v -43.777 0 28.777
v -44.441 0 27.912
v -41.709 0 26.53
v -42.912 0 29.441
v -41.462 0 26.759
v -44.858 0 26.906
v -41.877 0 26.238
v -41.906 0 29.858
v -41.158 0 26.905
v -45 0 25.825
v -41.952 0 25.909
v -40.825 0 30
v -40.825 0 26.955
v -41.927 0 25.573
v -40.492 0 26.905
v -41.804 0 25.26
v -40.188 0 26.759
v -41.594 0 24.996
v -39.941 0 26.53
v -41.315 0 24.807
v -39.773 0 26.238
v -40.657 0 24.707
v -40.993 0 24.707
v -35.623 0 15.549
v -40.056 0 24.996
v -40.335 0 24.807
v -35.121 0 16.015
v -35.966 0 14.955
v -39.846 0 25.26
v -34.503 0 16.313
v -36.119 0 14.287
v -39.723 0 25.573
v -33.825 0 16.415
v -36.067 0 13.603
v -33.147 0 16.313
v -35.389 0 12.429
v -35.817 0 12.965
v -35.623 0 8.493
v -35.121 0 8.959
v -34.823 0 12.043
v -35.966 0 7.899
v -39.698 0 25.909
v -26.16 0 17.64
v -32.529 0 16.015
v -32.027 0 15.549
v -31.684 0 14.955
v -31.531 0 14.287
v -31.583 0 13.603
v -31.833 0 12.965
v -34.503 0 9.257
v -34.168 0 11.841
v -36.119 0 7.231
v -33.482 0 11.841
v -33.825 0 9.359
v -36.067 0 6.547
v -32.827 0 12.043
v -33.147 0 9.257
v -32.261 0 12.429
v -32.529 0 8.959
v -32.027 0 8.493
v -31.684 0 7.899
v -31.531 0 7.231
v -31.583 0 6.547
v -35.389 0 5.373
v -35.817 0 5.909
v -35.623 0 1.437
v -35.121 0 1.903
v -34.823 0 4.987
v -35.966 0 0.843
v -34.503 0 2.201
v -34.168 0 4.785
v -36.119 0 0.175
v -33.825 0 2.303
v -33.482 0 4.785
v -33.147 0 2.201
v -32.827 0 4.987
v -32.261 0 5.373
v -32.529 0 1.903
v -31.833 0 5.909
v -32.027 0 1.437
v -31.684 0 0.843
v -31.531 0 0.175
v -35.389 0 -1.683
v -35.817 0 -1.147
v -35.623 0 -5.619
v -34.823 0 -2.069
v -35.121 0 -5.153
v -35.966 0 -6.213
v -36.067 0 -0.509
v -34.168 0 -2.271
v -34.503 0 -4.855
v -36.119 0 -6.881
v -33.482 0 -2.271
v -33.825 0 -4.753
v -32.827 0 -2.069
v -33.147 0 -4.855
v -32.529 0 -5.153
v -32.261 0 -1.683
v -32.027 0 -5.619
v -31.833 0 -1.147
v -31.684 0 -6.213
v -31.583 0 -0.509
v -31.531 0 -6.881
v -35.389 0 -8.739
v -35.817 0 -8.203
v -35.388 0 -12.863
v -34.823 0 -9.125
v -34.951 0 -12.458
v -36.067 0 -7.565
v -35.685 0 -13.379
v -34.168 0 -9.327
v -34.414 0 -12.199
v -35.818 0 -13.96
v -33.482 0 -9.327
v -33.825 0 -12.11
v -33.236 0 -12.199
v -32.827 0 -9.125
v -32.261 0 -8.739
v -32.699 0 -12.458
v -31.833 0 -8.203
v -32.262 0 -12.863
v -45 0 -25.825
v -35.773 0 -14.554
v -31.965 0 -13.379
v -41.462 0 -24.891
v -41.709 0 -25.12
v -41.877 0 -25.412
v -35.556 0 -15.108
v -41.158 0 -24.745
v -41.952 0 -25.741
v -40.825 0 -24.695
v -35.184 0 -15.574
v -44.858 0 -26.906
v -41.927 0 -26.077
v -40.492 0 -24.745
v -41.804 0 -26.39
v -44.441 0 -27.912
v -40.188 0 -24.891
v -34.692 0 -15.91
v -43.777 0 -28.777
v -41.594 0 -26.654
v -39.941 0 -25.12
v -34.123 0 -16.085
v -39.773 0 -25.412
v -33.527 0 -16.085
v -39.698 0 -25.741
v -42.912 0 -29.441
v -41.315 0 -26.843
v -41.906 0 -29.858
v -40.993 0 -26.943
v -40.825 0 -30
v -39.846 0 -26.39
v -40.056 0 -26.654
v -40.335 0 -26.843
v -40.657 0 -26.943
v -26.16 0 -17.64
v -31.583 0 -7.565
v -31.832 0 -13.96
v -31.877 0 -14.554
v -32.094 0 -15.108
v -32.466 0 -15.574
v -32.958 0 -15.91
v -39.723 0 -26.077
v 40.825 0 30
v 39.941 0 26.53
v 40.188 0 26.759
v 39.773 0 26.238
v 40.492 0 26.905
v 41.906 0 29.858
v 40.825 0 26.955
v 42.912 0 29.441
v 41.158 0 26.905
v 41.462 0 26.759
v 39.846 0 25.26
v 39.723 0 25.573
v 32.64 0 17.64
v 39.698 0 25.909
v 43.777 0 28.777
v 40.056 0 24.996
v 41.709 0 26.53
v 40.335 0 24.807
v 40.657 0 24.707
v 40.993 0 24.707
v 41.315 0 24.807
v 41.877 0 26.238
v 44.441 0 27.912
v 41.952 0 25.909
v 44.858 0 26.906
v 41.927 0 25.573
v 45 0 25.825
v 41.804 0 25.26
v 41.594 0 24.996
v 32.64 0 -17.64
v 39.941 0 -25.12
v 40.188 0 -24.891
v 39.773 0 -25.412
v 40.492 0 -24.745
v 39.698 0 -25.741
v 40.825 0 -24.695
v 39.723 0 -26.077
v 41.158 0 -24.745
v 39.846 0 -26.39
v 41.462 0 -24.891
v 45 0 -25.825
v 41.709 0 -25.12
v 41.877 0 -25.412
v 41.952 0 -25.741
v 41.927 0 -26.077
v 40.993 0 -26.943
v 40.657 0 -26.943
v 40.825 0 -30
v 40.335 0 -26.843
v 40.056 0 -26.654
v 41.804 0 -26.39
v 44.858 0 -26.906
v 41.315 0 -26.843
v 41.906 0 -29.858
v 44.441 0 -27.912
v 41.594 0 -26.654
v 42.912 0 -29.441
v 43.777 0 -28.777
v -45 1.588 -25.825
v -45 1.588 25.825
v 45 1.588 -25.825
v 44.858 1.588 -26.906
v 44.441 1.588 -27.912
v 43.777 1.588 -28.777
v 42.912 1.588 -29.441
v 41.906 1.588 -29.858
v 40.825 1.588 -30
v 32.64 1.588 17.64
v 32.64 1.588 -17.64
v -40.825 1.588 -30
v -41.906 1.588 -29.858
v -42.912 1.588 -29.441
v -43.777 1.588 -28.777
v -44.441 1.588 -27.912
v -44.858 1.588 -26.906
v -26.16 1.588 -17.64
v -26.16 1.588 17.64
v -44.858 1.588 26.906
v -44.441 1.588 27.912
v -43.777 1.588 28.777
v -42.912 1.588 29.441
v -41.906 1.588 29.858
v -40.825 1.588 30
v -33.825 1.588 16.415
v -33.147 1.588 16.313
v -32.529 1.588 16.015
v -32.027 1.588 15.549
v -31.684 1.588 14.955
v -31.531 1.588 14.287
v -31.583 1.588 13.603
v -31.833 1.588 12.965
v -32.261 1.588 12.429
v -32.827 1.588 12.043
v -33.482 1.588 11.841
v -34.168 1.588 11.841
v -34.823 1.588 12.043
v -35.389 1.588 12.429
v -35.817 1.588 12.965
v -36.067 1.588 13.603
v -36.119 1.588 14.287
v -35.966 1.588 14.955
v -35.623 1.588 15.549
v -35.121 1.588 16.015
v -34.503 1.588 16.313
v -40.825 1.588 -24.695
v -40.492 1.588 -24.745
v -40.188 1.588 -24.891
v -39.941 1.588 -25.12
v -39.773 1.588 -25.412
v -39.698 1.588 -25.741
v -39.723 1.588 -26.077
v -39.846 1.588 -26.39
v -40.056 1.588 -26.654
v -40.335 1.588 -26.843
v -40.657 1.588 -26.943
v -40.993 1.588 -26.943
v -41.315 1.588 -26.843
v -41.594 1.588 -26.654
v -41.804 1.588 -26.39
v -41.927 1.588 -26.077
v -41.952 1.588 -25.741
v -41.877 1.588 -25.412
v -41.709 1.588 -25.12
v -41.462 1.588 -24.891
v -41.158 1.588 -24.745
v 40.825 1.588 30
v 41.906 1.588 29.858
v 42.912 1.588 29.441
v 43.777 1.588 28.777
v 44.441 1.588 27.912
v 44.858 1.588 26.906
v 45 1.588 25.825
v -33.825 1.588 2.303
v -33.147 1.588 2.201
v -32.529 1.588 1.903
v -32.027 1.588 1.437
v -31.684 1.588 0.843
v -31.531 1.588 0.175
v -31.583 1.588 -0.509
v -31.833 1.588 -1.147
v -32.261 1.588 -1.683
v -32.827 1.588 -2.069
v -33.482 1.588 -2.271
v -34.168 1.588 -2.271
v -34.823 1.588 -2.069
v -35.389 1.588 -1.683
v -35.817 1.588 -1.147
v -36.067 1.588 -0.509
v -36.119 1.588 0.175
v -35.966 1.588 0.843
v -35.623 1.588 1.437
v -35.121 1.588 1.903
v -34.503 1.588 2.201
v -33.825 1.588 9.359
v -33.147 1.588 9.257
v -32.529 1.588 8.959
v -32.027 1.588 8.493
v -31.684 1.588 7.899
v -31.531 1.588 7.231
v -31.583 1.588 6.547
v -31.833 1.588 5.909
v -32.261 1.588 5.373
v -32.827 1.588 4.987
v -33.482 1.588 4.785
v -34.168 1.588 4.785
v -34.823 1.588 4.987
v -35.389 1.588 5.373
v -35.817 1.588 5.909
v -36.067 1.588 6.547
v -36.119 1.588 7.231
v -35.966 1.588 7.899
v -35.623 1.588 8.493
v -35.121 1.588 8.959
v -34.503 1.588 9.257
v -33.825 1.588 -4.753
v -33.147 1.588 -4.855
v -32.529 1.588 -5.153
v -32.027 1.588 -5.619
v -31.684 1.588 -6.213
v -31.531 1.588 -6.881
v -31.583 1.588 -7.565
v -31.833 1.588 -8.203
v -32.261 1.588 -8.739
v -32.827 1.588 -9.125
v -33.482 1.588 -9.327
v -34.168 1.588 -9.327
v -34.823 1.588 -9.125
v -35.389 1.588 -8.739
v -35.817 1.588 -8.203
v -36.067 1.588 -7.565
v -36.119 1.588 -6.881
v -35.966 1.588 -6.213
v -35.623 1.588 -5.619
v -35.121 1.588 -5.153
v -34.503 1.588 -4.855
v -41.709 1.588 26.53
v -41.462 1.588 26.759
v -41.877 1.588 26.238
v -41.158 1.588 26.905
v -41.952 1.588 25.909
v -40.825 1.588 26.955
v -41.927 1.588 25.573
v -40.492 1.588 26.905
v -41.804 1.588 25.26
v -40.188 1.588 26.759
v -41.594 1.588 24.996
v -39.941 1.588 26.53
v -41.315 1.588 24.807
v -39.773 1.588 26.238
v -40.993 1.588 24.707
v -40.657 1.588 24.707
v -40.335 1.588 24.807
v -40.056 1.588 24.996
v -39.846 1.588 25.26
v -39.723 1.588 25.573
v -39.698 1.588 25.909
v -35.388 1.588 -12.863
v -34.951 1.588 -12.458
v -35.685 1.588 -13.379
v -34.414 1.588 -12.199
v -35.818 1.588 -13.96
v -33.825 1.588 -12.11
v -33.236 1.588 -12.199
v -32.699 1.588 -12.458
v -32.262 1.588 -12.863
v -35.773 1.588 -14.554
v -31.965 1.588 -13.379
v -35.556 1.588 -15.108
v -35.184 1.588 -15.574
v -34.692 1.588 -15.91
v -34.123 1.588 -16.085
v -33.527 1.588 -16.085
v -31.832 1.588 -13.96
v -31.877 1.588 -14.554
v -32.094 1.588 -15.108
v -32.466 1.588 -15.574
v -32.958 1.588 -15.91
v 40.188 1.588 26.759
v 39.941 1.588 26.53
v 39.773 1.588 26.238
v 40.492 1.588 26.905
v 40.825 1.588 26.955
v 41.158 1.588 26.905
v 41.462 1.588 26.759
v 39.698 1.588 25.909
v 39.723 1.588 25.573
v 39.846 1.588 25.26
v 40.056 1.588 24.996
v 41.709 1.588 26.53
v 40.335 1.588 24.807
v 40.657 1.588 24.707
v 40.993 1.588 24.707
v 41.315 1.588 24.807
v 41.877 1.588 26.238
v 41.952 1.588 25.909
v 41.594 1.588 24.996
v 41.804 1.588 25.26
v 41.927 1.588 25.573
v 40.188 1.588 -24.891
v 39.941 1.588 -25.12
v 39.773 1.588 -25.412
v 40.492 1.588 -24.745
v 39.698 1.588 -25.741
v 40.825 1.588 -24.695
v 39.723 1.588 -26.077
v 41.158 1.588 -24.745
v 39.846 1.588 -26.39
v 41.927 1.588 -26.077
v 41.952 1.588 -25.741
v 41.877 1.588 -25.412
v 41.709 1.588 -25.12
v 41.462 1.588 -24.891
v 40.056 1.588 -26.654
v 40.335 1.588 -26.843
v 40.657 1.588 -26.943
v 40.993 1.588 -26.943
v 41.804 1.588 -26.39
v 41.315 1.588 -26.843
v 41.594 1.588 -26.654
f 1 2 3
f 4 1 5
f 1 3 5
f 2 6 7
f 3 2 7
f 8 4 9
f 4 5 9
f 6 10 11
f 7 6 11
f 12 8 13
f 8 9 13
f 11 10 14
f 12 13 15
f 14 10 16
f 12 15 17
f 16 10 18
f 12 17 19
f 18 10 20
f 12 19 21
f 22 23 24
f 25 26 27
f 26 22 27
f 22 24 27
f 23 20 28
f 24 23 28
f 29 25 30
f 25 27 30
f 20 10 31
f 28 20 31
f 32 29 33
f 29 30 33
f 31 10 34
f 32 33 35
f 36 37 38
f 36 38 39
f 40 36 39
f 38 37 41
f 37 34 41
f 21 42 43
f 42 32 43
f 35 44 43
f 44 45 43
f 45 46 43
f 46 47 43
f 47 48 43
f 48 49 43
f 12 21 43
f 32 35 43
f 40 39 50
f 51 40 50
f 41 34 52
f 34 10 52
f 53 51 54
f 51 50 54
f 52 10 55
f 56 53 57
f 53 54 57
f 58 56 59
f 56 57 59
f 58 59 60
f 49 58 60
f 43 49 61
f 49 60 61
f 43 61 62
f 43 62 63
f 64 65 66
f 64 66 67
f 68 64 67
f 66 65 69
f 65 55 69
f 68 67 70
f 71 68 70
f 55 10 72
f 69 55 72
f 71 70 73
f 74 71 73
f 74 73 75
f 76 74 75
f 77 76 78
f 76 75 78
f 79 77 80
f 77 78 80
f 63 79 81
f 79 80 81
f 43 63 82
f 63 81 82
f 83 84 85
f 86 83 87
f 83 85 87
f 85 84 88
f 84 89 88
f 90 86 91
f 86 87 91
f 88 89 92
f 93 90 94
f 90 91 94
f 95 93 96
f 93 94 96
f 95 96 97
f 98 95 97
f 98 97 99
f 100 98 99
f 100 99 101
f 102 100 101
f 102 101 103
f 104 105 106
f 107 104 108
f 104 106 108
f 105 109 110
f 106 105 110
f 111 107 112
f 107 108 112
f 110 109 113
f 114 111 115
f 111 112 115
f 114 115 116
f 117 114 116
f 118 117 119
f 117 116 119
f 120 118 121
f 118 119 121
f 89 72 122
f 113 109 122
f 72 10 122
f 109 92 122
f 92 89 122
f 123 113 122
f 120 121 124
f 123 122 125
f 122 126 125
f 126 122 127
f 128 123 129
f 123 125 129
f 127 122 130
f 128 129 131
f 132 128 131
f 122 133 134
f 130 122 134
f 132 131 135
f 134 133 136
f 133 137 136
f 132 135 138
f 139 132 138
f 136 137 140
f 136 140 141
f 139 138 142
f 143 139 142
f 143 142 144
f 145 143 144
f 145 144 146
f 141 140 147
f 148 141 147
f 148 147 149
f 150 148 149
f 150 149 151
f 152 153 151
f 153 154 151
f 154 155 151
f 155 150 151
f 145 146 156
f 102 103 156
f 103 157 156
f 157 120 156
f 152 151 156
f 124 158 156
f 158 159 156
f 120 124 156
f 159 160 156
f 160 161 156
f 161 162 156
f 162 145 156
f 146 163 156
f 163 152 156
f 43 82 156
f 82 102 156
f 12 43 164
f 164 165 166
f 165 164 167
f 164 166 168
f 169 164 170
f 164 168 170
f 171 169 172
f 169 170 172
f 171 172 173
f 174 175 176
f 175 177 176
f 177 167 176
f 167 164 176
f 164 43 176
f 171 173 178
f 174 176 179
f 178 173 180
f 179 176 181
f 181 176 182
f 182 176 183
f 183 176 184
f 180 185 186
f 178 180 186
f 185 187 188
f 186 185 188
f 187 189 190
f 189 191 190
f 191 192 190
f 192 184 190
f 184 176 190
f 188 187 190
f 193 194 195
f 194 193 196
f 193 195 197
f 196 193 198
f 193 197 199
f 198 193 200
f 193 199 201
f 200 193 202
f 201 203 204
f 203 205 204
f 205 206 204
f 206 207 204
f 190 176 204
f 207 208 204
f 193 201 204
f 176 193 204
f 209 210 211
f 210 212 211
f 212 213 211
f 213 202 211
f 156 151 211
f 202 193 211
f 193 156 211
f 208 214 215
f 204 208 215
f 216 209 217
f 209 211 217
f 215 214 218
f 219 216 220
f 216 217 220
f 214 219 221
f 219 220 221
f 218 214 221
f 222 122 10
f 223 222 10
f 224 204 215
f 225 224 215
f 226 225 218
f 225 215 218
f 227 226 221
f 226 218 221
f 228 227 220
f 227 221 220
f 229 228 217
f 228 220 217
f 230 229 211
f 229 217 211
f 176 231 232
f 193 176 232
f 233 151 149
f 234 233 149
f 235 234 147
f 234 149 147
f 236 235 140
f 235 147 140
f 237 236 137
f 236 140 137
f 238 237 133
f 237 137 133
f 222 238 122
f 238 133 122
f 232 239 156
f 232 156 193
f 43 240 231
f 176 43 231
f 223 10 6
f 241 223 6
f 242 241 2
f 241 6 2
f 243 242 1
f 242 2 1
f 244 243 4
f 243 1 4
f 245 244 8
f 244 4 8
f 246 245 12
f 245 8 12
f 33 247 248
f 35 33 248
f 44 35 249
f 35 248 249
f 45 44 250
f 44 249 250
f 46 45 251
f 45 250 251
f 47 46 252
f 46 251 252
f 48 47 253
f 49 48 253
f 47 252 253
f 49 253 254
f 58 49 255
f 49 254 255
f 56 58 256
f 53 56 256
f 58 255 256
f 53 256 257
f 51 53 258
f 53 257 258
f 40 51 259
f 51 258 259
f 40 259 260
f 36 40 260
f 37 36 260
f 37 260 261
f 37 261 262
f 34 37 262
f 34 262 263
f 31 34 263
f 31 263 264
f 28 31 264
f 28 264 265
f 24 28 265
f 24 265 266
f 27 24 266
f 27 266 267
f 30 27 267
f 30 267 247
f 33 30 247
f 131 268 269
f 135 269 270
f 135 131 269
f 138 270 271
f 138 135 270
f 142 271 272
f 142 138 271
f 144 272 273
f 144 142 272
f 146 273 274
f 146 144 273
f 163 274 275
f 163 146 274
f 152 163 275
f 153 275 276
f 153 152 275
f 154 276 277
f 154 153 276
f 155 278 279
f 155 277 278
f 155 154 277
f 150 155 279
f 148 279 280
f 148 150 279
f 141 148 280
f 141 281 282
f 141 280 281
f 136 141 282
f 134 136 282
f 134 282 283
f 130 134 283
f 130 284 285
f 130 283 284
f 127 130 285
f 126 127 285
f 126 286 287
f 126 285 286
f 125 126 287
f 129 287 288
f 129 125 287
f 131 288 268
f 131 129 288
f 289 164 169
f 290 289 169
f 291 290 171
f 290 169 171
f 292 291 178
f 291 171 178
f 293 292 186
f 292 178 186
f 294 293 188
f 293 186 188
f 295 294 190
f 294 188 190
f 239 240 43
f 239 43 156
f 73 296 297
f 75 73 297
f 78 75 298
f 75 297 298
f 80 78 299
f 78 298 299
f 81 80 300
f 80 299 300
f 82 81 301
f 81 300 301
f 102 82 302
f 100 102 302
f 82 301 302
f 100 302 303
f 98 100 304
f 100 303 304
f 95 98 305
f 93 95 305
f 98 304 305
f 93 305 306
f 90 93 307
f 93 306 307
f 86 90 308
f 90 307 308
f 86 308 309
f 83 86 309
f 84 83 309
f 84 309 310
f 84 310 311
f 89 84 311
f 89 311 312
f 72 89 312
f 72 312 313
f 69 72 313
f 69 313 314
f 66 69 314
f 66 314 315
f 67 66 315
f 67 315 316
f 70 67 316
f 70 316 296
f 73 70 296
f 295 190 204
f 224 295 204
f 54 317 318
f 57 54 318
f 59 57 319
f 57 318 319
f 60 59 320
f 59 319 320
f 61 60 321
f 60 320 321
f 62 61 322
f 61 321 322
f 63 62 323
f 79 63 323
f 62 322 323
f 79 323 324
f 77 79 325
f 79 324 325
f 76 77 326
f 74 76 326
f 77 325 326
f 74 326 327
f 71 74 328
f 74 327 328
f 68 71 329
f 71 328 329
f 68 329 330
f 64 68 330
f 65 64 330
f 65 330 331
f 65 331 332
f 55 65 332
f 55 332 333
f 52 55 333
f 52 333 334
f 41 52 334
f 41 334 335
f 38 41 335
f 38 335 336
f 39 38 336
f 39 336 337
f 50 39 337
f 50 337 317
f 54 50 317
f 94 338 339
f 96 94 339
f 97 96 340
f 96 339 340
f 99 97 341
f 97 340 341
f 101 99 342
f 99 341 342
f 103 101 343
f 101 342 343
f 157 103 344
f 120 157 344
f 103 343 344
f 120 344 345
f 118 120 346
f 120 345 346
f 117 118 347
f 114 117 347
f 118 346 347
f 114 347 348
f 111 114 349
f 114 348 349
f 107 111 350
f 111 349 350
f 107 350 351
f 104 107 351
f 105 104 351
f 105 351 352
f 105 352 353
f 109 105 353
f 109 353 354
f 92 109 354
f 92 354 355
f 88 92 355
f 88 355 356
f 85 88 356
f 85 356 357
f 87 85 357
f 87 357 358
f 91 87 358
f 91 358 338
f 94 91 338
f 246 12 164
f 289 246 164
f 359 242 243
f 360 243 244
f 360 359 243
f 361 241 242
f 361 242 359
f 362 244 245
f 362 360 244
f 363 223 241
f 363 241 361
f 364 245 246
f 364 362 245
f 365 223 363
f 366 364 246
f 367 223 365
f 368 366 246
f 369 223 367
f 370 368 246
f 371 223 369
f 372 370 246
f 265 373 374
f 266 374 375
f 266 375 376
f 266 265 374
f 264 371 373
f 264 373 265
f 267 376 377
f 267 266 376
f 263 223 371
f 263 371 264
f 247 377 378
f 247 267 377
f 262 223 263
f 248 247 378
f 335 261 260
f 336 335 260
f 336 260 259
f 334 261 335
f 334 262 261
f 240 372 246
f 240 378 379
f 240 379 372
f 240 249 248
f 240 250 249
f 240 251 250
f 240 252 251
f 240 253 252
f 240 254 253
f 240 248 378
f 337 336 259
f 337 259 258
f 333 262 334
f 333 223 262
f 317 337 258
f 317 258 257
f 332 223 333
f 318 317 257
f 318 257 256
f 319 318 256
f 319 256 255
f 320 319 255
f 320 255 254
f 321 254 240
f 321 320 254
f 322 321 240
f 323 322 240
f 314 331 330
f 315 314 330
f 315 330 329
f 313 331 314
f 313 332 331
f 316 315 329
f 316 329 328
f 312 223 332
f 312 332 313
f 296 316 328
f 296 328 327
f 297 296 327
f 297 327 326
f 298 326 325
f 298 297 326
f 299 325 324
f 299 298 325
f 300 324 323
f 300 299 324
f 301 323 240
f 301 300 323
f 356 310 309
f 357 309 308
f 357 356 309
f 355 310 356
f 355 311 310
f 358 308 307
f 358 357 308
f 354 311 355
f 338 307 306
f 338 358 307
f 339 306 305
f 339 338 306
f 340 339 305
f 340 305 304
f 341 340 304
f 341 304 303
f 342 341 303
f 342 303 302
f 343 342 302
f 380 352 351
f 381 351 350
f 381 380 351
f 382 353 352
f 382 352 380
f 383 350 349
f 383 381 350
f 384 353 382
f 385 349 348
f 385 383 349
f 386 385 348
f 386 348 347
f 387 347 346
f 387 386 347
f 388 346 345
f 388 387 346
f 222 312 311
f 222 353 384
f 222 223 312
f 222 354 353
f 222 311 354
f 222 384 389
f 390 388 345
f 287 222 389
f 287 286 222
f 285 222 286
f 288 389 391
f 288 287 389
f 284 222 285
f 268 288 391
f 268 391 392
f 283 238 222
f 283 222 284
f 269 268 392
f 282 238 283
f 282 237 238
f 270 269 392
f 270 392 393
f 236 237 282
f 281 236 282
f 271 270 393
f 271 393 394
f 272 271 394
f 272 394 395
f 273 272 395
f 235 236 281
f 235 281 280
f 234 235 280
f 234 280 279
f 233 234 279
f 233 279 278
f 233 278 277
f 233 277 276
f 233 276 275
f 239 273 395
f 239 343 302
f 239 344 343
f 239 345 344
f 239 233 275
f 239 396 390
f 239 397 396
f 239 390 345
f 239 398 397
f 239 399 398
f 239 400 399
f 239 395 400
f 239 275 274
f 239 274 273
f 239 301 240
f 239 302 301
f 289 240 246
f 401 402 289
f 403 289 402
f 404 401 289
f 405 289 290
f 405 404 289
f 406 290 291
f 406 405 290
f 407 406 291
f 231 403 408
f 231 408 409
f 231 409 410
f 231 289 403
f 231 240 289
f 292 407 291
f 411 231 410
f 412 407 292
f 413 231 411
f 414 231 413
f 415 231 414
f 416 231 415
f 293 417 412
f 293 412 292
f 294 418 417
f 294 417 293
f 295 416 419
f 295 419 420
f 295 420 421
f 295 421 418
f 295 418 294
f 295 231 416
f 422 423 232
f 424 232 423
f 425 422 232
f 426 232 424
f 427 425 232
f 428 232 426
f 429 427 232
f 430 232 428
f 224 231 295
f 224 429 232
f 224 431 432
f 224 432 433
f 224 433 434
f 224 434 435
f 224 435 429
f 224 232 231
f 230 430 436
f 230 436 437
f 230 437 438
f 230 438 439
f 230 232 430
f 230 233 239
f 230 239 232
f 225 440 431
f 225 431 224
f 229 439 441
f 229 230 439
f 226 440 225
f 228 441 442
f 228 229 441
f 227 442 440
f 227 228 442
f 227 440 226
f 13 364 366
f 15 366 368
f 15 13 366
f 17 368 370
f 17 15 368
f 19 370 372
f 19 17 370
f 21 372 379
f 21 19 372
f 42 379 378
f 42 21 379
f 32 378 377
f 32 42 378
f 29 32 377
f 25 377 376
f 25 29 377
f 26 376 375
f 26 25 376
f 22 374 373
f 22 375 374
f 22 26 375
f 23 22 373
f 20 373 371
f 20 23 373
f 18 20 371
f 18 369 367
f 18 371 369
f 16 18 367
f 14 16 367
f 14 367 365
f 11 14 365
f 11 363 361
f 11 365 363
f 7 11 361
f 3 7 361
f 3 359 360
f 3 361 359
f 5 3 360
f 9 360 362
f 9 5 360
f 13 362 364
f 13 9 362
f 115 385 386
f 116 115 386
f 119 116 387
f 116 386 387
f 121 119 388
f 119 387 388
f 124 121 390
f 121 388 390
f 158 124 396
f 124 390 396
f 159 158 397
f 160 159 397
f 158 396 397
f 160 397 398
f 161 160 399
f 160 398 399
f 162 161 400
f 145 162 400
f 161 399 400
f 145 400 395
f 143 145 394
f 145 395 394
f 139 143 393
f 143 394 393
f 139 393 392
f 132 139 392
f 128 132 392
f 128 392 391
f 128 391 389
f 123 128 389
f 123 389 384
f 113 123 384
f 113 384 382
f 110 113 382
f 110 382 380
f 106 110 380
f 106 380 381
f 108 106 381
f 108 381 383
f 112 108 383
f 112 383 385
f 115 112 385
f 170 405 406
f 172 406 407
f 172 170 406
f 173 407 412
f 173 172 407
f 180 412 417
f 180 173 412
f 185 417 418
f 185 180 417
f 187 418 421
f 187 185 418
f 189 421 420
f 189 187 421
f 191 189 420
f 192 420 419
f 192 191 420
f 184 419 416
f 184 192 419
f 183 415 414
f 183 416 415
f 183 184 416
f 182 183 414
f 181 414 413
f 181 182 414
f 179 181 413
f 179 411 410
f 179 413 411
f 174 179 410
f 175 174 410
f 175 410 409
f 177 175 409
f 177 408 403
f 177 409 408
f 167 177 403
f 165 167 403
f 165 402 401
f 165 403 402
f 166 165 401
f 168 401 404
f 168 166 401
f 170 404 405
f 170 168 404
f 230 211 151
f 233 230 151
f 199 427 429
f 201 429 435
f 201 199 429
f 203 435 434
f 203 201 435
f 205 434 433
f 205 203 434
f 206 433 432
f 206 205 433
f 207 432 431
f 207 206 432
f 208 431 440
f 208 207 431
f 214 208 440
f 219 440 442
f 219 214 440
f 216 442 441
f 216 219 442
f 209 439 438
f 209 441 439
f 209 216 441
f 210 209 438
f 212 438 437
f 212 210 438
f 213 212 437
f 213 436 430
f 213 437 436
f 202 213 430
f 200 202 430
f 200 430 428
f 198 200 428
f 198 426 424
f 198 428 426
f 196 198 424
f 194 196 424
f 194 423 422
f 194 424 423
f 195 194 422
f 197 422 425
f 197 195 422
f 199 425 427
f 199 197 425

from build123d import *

# Parameters (mm, degrees)
SKETCH2_R                 = 1.1303
BOSS_EXTRUDE3_DEPTH       = 1.5875
SKETCH4_R                 = 1.9986
SKETCH4_R_2               = 2.3
CUT_EXTRUDE1_DEPTH        = 55.106562968
SKETCH3_W                 = 58.8
SKETCH3_H                 = 35.28
CUT_EXTRUDE2_DEPTH        = 55.106562968
TAP_DRILL_FOR_4_40_TAP1_D = 2.2606


with BuildPart() as part:
    # Sketch2 → Boss-Extrude3 (new body)
    with BuildSketch(Plane(origin=(0, 0, 0), x_dir=(1, 0, 0), z_dir=(0, 1, 0))):
        with BuildLine():
            Line((-45, 25.825), (-45, -25.825))
            ThreePointArc((-45, -25.825), (-43.777170811, -28.777170811), (-40.825, -30))
            Line((-40.825, -30), (40.825, -30))
            ThreePointArc((40.825, -30), (43.777170811, -28.777170811), (45, -25.825))
            Line((45, -25.825), (45, 25.825))
            ThreePointArc((45, 25.825), (43.777170811, 28.777170811), (40.825, 30))
            Line((40.825, 30), (-40.825, 30))
            ThreePointArc((-40.825, 30), (-43.777170811, 28.777170811), (-45, 25.825))
        make_face()
        with Locations(Location((40.825, 25.825, 0), (0, 0, 270))):
            Circle(SKETCH2_R, mode=Mode.SUBTRACT)
        with Locations(Location((40.825, -25.825, 0), (0, 0, 270))):
            Circle(SKETCH2_R, mode=Mode.SUBTRACT)
        with Locations(Location((-40.825, 25.825, 0), (0, 0, 270))):
            Circle(SKETCH2_R, mode=Mode.SUBTRACT)
        with Locations(Location((-40.825, -25.825, 0), (0, 0, 270))):
            Circle(SKETCH2_R, mode=Mode.SUBTRACT)
    extrude(amount=BOSS_EXTRUDE3_DEPTH)

    # Sketch4 → Cut-Extrude1 (cut, through all)
    with BuildSketch(Plane(origin=(0, 1.5875, 0), x_dir=(1, 0, 0), z_dir=(0, 1, 0))):
        with Locations(Location((-33.825, 14.109, 0), (0, 0, 270))):
            Circle(SKETCH4_R)
        with Locations(Location((-33.825, 7.053, 0), (0, 0, 270))):
            Circle(SKETCH4_R_2)
        with Locations(Location((-33.825, -0.003, 0), (0, 0, 270))):
            Circle(SKETCH4_R_2)
        with Locations(Location((-33.825, -7.059, 0), (0, 0, 270))):
            Circle(SKETCH4_R_2)
        with Locations(Location((-33.825, -14.115, 0), (0, 0, 270))):
            Circle(SKETCH4_R_2)
    extrude(amount=-CUT_EXTRUDE1_DEPTH, mode=Mode.SUBTRACT)

    # Sketch3 → Cut-Extrude2 (cut, through all)
    with BuildSketch(Plane(origin=(0, 1.5875, 0), x_dir=(1, 0, 0), z_dir=(0, 1, 0))):
        with Locations((3.24, 0)):
            Rectangle(SKETCH3_W, SKETCH3_H)
    extrude(amount=-CUT_EXTRUDE2_DEPTH, mode=Mode.SUBTRACT)

    # Tap Drill for #4-40 Tap1 (through all)
    with Locations(Plane(origin=(-40.825, 1.5875, 25.825), x_dir=(0, 0, 1), z_dir=(0, 1, 0))):
        with Locations((0, 0), (-51.65, 0), (-51.65, 81.65), (0, 81.65)):
            Hole(TAP_DRILL_FOR_4_40_TAP1_D / 2)


solid = part.part
